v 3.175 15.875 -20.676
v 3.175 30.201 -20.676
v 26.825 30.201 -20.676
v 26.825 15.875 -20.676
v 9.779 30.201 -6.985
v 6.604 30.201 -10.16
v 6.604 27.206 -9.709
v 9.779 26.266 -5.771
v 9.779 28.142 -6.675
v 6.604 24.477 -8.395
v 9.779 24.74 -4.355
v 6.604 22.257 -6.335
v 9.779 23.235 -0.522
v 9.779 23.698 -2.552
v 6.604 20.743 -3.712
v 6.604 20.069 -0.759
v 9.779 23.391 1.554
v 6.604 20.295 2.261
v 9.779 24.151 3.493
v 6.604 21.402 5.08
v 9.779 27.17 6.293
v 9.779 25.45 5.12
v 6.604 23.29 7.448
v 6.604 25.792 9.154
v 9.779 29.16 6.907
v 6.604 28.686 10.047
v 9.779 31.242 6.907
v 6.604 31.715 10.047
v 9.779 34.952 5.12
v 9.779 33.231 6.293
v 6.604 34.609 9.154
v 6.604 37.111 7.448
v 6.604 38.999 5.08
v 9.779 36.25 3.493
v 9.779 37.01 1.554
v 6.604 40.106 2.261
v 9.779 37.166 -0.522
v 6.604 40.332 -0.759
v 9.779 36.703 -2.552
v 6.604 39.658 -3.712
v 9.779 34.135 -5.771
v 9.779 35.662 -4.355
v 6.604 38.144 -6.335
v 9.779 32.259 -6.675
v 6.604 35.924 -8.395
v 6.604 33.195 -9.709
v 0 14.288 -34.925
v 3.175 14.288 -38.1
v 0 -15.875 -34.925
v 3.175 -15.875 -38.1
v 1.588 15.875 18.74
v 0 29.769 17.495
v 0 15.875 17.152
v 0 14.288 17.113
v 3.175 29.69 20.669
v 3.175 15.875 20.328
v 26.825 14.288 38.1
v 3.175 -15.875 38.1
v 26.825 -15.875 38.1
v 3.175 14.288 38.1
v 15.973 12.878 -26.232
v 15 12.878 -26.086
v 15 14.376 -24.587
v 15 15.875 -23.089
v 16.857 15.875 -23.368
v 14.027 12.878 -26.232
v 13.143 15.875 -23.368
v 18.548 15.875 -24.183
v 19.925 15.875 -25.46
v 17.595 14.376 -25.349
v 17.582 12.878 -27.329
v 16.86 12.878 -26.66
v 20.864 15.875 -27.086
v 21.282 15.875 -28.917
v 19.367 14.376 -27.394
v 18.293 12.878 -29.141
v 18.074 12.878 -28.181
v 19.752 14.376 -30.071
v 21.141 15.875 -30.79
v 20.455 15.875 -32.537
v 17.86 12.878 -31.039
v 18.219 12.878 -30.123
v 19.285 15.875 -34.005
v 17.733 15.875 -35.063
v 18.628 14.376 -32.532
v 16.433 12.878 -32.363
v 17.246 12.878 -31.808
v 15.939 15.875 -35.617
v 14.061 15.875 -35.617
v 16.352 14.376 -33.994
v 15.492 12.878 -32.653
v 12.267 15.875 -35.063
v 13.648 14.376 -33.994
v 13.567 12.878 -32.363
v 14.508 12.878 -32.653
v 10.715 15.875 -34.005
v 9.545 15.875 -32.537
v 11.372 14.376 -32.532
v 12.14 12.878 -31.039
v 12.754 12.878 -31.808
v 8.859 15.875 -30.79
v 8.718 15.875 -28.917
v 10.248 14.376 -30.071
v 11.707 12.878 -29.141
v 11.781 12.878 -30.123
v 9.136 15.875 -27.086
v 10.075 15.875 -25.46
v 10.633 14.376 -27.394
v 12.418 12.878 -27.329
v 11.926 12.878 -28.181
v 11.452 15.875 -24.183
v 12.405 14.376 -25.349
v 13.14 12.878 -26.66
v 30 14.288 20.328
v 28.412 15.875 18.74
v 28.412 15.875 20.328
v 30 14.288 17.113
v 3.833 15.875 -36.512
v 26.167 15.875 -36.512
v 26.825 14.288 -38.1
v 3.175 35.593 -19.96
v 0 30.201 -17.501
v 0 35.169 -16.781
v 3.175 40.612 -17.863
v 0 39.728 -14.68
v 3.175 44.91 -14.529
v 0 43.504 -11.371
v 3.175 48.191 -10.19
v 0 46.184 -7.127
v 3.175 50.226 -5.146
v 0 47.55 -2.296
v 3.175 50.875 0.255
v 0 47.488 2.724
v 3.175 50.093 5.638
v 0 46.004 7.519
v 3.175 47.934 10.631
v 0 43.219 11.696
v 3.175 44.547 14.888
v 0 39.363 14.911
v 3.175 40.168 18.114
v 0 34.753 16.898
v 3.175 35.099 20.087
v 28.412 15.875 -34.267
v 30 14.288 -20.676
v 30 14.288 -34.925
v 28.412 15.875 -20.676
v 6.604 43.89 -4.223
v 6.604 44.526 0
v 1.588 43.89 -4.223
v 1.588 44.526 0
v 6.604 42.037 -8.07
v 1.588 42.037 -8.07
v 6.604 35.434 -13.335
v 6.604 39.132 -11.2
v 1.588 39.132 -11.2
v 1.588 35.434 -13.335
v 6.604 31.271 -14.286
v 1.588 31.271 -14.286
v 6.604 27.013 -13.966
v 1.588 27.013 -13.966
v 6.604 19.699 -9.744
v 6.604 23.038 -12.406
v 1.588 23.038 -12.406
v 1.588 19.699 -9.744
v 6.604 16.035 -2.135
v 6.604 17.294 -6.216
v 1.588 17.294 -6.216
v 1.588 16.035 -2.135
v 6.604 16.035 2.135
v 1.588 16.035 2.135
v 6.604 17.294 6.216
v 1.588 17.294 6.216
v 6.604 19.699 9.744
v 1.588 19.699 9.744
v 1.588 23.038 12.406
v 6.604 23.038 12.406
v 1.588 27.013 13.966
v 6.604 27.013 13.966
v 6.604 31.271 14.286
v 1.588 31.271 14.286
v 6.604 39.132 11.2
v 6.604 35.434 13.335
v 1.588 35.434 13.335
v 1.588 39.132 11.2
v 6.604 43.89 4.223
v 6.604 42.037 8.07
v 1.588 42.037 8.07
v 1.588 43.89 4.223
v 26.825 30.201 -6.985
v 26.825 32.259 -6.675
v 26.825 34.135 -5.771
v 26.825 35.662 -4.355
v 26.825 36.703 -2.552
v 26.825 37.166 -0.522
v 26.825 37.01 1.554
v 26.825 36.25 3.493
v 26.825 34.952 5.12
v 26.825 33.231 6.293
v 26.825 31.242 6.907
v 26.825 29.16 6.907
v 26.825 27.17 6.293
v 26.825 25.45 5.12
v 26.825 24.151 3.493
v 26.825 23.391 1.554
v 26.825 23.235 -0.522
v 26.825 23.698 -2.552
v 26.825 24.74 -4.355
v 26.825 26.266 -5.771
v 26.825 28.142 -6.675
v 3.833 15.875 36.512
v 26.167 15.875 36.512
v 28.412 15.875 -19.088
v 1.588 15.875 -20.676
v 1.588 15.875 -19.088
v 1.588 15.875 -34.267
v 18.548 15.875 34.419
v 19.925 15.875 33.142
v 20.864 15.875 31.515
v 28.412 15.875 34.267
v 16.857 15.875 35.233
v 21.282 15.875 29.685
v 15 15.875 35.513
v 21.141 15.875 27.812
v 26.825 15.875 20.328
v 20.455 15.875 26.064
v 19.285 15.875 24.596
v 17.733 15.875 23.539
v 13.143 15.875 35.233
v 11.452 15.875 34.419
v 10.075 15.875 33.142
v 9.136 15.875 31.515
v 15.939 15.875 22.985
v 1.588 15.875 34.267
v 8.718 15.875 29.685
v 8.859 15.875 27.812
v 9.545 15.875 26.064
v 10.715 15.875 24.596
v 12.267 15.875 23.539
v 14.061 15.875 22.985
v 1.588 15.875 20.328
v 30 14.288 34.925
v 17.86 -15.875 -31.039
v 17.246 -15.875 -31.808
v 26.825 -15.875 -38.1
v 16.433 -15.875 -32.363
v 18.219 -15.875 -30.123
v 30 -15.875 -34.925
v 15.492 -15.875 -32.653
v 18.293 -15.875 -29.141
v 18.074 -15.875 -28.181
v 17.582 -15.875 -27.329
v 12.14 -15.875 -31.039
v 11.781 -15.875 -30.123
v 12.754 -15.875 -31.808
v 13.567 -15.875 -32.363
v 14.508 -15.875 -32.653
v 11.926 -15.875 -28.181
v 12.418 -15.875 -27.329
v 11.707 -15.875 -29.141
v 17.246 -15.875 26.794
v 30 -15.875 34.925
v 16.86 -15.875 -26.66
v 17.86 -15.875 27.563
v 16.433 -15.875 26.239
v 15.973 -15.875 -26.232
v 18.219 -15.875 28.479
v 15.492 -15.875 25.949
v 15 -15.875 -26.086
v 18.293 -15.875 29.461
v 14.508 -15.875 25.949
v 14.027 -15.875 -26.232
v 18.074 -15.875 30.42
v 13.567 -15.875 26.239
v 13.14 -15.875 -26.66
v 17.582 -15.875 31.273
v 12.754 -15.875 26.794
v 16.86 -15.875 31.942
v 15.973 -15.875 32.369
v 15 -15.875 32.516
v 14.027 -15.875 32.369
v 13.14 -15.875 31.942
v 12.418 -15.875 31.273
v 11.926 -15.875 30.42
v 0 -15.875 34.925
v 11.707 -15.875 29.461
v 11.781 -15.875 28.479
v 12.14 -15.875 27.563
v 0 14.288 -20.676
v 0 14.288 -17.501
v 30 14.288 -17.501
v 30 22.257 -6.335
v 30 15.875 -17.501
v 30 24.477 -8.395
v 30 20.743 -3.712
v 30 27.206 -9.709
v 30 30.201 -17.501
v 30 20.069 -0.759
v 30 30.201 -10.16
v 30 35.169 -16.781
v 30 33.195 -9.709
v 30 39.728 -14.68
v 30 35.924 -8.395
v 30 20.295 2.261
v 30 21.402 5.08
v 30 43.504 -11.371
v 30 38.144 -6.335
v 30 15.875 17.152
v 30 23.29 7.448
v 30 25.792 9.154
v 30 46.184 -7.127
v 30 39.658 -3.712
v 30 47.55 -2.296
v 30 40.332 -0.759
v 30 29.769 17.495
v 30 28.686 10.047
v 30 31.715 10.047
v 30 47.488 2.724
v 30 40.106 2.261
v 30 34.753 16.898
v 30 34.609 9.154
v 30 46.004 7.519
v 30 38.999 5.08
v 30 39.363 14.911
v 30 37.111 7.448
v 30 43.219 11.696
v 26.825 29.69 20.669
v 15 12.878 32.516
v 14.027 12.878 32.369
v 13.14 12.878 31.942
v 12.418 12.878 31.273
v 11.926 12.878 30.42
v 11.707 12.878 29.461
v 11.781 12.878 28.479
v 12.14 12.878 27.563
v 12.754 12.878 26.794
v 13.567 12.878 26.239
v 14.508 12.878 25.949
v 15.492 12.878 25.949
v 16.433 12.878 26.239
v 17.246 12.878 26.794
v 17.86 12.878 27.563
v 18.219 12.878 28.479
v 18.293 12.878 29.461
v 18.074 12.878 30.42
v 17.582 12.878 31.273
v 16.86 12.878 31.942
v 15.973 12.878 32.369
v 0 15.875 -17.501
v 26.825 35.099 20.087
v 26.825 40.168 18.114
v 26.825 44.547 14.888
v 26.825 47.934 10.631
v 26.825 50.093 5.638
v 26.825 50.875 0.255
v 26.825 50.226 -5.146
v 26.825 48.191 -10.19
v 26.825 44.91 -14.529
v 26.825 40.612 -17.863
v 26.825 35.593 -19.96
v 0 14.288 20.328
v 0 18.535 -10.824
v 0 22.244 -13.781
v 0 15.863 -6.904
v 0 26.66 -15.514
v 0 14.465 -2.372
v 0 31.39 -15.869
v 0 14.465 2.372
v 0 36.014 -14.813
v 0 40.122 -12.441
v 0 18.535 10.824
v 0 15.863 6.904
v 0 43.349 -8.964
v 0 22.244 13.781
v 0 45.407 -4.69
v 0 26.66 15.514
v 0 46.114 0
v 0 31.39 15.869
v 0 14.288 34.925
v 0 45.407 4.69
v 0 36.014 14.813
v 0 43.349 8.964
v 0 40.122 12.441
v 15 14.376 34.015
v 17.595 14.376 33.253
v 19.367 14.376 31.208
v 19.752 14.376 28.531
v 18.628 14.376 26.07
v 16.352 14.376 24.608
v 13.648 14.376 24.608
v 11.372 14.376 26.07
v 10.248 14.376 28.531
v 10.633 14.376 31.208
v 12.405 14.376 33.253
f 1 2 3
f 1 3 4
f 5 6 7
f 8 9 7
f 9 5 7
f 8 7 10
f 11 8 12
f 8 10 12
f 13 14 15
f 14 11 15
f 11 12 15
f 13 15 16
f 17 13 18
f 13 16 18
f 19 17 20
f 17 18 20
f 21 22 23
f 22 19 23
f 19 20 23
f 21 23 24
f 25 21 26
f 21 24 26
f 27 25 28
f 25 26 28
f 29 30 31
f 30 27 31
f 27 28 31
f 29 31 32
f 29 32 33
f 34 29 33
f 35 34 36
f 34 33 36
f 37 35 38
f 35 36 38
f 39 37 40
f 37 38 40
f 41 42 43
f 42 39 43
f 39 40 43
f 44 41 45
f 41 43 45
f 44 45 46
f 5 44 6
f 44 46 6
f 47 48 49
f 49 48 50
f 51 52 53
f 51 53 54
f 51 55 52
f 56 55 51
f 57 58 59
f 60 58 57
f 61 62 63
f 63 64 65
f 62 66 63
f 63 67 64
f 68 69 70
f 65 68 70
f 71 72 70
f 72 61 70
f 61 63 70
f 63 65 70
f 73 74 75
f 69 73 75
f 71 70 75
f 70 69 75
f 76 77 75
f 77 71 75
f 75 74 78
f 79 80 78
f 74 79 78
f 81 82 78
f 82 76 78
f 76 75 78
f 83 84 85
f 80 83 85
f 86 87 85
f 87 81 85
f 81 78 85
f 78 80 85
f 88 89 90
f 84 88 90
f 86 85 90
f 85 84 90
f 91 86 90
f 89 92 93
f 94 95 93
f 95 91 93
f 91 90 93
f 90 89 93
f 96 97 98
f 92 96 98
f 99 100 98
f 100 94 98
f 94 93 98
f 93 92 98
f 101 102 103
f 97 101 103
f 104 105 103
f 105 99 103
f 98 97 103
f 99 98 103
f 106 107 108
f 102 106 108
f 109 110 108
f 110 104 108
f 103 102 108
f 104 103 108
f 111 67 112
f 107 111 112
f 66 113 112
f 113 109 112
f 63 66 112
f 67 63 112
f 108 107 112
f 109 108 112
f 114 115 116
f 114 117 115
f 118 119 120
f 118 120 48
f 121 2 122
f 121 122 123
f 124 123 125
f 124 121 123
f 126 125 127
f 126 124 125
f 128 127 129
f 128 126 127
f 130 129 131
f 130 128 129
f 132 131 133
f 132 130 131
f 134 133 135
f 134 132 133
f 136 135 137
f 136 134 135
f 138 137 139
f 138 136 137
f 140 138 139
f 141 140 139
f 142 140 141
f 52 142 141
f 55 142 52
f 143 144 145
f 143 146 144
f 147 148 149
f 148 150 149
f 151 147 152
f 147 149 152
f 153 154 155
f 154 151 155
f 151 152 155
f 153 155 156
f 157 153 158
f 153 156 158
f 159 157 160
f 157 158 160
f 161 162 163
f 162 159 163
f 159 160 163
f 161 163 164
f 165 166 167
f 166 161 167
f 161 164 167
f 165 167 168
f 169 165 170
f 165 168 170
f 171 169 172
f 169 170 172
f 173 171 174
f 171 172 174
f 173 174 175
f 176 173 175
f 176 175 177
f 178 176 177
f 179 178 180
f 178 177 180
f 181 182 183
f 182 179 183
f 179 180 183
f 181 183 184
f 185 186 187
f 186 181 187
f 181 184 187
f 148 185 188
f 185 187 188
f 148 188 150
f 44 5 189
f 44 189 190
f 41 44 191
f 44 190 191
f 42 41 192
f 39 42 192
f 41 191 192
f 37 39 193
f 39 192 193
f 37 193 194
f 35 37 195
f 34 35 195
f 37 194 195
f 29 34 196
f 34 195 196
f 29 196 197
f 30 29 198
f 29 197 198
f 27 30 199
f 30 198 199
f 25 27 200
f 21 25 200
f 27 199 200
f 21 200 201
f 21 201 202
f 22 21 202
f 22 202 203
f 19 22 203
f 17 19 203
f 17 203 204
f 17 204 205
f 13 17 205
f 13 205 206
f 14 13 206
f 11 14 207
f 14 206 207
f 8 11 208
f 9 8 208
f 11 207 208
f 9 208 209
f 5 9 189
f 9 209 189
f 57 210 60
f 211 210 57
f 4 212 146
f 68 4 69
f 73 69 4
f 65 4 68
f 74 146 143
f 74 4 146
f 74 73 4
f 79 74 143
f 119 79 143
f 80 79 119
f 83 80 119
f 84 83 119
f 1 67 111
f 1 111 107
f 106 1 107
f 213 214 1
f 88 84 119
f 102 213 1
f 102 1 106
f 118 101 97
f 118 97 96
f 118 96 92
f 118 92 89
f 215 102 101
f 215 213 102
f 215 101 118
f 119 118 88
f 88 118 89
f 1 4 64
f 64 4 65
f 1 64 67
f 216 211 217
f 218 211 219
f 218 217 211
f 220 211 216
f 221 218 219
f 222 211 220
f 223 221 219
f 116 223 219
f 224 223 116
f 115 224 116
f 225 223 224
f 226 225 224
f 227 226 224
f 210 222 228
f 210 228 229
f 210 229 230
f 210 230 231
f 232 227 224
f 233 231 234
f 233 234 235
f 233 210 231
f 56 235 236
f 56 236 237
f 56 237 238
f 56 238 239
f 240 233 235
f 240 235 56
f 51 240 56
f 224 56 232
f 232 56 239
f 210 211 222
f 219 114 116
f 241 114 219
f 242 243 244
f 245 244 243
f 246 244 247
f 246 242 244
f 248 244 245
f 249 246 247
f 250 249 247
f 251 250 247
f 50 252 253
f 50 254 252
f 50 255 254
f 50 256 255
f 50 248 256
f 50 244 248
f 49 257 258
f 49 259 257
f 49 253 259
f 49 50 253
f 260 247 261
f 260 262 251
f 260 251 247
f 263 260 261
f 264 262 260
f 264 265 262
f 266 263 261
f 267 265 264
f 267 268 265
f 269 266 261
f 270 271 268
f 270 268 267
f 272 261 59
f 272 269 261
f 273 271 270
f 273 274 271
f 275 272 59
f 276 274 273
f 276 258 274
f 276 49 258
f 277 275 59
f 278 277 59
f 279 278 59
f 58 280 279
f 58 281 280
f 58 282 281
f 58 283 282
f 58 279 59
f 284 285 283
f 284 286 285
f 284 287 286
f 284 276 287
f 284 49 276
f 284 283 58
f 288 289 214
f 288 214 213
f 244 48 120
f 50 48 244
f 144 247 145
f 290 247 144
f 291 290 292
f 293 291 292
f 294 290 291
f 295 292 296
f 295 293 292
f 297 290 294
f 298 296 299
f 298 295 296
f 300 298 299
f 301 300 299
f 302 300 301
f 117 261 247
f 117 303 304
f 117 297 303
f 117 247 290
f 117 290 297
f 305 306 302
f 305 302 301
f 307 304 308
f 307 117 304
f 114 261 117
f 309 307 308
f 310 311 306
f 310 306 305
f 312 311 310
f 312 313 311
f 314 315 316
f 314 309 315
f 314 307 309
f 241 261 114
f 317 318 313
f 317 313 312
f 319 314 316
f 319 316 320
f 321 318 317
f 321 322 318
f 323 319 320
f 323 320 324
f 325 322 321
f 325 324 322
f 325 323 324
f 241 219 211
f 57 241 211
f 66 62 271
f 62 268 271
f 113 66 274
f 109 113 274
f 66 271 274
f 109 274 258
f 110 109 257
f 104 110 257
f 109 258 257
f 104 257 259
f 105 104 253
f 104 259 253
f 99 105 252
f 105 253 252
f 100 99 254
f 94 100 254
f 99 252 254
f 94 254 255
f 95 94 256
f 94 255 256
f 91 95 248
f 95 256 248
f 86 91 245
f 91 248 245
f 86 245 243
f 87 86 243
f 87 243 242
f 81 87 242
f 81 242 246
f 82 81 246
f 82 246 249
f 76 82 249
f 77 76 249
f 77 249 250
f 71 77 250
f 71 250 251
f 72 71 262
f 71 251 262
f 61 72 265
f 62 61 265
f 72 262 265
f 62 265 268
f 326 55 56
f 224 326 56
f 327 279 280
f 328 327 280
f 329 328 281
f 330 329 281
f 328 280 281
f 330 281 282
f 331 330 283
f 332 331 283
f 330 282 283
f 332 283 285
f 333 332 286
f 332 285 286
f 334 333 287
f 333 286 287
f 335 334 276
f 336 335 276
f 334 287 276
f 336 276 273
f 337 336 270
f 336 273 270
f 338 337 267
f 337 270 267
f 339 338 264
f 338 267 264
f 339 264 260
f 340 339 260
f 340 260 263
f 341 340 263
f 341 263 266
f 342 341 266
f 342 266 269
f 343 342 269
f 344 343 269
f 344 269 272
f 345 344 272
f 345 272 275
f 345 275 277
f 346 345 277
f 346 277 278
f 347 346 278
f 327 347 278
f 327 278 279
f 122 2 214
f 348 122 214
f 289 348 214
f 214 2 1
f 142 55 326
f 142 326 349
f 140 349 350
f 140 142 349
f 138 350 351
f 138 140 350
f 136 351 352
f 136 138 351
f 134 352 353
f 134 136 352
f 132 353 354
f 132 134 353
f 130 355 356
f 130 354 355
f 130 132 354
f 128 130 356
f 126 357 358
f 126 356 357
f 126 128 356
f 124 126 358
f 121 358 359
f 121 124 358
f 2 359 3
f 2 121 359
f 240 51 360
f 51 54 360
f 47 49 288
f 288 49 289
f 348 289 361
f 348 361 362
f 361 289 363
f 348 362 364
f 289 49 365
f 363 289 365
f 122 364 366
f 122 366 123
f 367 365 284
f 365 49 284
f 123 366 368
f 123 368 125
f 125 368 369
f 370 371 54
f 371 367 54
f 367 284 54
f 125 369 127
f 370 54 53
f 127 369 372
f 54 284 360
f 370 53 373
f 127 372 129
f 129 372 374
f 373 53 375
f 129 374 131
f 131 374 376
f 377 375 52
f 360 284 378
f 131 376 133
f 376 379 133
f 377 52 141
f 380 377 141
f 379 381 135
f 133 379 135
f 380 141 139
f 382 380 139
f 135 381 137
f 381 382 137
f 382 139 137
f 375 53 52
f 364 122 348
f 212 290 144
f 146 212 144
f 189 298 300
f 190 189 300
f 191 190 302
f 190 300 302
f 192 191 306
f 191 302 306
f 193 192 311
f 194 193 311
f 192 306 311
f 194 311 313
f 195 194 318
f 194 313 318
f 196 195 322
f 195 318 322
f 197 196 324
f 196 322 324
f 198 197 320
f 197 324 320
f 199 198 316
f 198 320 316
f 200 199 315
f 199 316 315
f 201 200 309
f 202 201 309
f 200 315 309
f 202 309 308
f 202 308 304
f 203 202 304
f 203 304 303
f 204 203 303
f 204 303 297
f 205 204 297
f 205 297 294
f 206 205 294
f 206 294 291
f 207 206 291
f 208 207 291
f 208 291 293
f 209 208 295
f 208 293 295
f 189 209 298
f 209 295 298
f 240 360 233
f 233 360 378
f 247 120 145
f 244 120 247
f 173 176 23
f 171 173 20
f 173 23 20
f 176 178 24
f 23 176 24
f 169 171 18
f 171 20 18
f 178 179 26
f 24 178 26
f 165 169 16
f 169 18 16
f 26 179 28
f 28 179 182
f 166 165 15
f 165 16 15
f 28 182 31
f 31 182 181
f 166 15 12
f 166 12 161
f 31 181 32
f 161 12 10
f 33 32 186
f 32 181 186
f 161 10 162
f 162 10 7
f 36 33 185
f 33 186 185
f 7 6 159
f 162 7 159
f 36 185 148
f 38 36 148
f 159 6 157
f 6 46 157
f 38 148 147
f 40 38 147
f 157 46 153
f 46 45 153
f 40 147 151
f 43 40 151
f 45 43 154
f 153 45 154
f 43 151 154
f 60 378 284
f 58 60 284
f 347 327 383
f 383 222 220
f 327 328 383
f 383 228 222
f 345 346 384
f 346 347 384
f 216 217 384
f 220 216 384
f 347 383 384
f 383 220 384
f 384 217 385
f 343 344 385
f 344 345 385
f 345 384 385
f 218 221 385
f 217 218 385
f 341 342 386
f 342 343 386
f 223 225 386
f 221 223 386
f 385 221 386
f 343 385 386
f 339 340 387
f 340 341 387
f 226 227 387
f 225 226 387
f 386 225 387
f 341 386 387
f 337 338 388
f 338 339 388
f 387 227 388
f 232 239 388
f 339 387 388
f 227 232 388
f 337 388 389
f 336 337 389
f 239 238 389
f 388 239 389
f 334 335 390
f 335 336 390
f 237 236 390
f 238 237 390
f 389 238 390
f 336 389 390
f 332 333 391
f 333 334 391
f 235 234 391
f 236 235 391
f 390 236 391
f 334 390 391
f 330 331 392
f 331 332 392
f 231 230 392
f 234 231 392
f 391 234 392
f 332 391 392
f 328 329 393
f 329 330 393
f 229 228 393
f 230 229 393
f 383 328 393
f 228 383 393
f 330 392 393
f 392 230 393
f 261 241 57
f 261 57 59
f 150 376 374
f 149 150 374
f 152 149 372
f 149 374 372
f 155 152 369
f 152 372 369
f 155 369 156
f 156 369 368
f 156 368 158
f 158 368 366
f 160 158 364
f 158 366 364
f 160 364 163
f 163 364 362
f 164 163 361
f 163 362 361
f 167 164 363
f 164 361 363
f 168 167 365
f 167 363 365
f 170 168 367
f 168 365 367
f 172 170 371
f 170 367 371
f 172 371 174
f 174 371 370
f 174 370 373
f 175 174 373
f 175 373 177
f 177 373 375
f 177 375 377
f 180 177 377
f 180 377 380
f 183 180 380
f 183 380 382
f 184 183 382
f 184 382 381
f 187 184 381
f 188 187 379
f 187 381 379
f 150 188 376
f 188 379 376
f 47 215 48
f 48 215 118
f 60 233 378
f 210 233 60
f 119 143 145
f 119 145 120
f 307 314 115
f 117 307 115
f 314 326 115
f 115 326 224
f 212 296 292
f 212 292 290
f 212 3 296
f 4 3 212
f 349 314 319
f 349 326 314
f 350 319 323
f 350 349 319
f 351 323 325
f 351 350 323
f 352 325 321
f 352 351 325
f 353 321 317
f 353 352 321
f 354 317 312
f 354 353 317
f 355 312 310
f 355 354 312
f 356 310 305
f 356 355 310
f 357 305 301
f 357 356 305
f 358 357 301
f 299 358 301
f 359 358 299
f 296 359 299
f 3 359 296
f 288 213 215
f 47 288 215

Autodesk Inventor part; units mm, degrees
ref_plane "YZ Plane" through (0, 0, 0) normal (1, 0, 0) x (0, 1, 0)
ref_plane "XZ Plane" through (0, 0, 0) normal (0, 1, 0) x (-1, 0, 0)
ref_plane "XY Plane" through (0, 0, 0) normal (0, 0, 1) x (1, 0, 0)
sketch "Sketch1" plane through (0, 0, 0) normal (1, 0, 0) x (0, 1, 0)
  line L0 (-15.875, 38.1) -> (15.875, 38.1)
  line L1 (15.875, -38.1) -> (-15.875, -38.1)
  line L2 (-15.875, -38.1) -> (-15.875, 38.1)
  line L3 (-15.875, 38.1) -> (15.875, -38.1) construction
  line L4 (15.875, 38.1) -> (-15.875, -38.1) construction
  circle A0 centre (30.2006, 0) radius 14.3256
  line L5 (29.6902, 20.6693) -> (15.875, 20.3282)
  line L6 (30.2006, -20.6756) -> (15.875, -20.6756)
  arc A1 (30.2006, -20.6756) -> (29.6902, 20.6693) centre (30.2006, 0) ccw
  line L7 (15.875, 38.1) -> (15.875, 20.3282)
  line L8 (15.875, -20.6756) -> (15.875, -38.1)
  point P0 (0, 0)
  point P1 (0, 0)
  point P2 (0, 0)
  dimension "d0" = 31.75
  dimension "d2" = 28.6512
  dimension "d4" = 6.35
  dimension "d5" = 1.414
  dimension "d24" = 76.2
extrude "Extrusion1" add sketch "Sketch1" along normal blind 30
sketch "Sketch2" plane through (30, 0, 0) normal (1, 0, 0) x (0, 0, -1)
  circle A0 centre (0, 30.2006) radius 14.3256 projected
  arc A1 (20.6756, 30.2006) -> (-20.6693, 29.6902) centre (0, 30.2006) ccw projected
  circle A2 centre (0, 30.2006) radius 6.985
  circle A3 centre (0, 30.2006) radius 14.3256
  point P0 (0, 0)
  dimension "d8" = 13.97
extrude "Extrusion2" add sketch "Sketch2" against normal blind 23.396
sketch "Sketch3" plane through (0, 15.875, -20.6756) normal (0, 1, 0) x (1, 0, 0)
  line L0 (30, 0) -> (0, 17.4244)
  line L1 (30, -41.0038) -> (30, -58.7756) projected
  line L2 (0, -41.0038) -> (30, -41.0038) projected
  line L3 (30, -58.7756) -> (0, -41.0038)
  point P0 (0, -20.6756)
  point P1 (15, -49.8897)
  point P2 (15, 8.7122)
hole "Hole1" at (15, 15.875, 29.2141) at (15, 15.875, -29.3878) direction (0, -1, 0) diameter 6.604 end through all countersink diameter 12.5984 countersink angle 90 clearance for "Flat Head Machine Screw" size "M6" standard "Ansi Metric M Profile"
chamfer "Chamfer1" distance 3.175 angle 45 12 edges at (0, 0, 38.1) (30, 0, 38.1) (0, 0, -38.1) (30, 0, -38.1) (0, 50.8746, 0.2552) (0, 23.0378, -20.6756) (0, 22.7826, 20.4987) (30, 50.8746, 0.2552) (30, 22.7826, 20.4987) (30, 23.0378, -20.6756) (30, 30.2006, 6.985) (6.604, 30.2006, 6.985)
chamfer "Chamfer2" distance 1.5875 angle 45 11 edges at (0, 15.875, -27.8003) (15, 15.875, -38.1) (30, 15.875, -27.8003) (30, 15.875, 27.6266) (28.4125, 15.875, 36.5125) (15, 15.875, 38.1) (1.5875, 15.875, 36.5125) (0, 15.875, 27.6266) (1.5875, 15.875, -36.5125) (28.4125, 15.875, -36.5125) (0, 15.875, 0)
properties part number "2316_Pillow Block_V1"
